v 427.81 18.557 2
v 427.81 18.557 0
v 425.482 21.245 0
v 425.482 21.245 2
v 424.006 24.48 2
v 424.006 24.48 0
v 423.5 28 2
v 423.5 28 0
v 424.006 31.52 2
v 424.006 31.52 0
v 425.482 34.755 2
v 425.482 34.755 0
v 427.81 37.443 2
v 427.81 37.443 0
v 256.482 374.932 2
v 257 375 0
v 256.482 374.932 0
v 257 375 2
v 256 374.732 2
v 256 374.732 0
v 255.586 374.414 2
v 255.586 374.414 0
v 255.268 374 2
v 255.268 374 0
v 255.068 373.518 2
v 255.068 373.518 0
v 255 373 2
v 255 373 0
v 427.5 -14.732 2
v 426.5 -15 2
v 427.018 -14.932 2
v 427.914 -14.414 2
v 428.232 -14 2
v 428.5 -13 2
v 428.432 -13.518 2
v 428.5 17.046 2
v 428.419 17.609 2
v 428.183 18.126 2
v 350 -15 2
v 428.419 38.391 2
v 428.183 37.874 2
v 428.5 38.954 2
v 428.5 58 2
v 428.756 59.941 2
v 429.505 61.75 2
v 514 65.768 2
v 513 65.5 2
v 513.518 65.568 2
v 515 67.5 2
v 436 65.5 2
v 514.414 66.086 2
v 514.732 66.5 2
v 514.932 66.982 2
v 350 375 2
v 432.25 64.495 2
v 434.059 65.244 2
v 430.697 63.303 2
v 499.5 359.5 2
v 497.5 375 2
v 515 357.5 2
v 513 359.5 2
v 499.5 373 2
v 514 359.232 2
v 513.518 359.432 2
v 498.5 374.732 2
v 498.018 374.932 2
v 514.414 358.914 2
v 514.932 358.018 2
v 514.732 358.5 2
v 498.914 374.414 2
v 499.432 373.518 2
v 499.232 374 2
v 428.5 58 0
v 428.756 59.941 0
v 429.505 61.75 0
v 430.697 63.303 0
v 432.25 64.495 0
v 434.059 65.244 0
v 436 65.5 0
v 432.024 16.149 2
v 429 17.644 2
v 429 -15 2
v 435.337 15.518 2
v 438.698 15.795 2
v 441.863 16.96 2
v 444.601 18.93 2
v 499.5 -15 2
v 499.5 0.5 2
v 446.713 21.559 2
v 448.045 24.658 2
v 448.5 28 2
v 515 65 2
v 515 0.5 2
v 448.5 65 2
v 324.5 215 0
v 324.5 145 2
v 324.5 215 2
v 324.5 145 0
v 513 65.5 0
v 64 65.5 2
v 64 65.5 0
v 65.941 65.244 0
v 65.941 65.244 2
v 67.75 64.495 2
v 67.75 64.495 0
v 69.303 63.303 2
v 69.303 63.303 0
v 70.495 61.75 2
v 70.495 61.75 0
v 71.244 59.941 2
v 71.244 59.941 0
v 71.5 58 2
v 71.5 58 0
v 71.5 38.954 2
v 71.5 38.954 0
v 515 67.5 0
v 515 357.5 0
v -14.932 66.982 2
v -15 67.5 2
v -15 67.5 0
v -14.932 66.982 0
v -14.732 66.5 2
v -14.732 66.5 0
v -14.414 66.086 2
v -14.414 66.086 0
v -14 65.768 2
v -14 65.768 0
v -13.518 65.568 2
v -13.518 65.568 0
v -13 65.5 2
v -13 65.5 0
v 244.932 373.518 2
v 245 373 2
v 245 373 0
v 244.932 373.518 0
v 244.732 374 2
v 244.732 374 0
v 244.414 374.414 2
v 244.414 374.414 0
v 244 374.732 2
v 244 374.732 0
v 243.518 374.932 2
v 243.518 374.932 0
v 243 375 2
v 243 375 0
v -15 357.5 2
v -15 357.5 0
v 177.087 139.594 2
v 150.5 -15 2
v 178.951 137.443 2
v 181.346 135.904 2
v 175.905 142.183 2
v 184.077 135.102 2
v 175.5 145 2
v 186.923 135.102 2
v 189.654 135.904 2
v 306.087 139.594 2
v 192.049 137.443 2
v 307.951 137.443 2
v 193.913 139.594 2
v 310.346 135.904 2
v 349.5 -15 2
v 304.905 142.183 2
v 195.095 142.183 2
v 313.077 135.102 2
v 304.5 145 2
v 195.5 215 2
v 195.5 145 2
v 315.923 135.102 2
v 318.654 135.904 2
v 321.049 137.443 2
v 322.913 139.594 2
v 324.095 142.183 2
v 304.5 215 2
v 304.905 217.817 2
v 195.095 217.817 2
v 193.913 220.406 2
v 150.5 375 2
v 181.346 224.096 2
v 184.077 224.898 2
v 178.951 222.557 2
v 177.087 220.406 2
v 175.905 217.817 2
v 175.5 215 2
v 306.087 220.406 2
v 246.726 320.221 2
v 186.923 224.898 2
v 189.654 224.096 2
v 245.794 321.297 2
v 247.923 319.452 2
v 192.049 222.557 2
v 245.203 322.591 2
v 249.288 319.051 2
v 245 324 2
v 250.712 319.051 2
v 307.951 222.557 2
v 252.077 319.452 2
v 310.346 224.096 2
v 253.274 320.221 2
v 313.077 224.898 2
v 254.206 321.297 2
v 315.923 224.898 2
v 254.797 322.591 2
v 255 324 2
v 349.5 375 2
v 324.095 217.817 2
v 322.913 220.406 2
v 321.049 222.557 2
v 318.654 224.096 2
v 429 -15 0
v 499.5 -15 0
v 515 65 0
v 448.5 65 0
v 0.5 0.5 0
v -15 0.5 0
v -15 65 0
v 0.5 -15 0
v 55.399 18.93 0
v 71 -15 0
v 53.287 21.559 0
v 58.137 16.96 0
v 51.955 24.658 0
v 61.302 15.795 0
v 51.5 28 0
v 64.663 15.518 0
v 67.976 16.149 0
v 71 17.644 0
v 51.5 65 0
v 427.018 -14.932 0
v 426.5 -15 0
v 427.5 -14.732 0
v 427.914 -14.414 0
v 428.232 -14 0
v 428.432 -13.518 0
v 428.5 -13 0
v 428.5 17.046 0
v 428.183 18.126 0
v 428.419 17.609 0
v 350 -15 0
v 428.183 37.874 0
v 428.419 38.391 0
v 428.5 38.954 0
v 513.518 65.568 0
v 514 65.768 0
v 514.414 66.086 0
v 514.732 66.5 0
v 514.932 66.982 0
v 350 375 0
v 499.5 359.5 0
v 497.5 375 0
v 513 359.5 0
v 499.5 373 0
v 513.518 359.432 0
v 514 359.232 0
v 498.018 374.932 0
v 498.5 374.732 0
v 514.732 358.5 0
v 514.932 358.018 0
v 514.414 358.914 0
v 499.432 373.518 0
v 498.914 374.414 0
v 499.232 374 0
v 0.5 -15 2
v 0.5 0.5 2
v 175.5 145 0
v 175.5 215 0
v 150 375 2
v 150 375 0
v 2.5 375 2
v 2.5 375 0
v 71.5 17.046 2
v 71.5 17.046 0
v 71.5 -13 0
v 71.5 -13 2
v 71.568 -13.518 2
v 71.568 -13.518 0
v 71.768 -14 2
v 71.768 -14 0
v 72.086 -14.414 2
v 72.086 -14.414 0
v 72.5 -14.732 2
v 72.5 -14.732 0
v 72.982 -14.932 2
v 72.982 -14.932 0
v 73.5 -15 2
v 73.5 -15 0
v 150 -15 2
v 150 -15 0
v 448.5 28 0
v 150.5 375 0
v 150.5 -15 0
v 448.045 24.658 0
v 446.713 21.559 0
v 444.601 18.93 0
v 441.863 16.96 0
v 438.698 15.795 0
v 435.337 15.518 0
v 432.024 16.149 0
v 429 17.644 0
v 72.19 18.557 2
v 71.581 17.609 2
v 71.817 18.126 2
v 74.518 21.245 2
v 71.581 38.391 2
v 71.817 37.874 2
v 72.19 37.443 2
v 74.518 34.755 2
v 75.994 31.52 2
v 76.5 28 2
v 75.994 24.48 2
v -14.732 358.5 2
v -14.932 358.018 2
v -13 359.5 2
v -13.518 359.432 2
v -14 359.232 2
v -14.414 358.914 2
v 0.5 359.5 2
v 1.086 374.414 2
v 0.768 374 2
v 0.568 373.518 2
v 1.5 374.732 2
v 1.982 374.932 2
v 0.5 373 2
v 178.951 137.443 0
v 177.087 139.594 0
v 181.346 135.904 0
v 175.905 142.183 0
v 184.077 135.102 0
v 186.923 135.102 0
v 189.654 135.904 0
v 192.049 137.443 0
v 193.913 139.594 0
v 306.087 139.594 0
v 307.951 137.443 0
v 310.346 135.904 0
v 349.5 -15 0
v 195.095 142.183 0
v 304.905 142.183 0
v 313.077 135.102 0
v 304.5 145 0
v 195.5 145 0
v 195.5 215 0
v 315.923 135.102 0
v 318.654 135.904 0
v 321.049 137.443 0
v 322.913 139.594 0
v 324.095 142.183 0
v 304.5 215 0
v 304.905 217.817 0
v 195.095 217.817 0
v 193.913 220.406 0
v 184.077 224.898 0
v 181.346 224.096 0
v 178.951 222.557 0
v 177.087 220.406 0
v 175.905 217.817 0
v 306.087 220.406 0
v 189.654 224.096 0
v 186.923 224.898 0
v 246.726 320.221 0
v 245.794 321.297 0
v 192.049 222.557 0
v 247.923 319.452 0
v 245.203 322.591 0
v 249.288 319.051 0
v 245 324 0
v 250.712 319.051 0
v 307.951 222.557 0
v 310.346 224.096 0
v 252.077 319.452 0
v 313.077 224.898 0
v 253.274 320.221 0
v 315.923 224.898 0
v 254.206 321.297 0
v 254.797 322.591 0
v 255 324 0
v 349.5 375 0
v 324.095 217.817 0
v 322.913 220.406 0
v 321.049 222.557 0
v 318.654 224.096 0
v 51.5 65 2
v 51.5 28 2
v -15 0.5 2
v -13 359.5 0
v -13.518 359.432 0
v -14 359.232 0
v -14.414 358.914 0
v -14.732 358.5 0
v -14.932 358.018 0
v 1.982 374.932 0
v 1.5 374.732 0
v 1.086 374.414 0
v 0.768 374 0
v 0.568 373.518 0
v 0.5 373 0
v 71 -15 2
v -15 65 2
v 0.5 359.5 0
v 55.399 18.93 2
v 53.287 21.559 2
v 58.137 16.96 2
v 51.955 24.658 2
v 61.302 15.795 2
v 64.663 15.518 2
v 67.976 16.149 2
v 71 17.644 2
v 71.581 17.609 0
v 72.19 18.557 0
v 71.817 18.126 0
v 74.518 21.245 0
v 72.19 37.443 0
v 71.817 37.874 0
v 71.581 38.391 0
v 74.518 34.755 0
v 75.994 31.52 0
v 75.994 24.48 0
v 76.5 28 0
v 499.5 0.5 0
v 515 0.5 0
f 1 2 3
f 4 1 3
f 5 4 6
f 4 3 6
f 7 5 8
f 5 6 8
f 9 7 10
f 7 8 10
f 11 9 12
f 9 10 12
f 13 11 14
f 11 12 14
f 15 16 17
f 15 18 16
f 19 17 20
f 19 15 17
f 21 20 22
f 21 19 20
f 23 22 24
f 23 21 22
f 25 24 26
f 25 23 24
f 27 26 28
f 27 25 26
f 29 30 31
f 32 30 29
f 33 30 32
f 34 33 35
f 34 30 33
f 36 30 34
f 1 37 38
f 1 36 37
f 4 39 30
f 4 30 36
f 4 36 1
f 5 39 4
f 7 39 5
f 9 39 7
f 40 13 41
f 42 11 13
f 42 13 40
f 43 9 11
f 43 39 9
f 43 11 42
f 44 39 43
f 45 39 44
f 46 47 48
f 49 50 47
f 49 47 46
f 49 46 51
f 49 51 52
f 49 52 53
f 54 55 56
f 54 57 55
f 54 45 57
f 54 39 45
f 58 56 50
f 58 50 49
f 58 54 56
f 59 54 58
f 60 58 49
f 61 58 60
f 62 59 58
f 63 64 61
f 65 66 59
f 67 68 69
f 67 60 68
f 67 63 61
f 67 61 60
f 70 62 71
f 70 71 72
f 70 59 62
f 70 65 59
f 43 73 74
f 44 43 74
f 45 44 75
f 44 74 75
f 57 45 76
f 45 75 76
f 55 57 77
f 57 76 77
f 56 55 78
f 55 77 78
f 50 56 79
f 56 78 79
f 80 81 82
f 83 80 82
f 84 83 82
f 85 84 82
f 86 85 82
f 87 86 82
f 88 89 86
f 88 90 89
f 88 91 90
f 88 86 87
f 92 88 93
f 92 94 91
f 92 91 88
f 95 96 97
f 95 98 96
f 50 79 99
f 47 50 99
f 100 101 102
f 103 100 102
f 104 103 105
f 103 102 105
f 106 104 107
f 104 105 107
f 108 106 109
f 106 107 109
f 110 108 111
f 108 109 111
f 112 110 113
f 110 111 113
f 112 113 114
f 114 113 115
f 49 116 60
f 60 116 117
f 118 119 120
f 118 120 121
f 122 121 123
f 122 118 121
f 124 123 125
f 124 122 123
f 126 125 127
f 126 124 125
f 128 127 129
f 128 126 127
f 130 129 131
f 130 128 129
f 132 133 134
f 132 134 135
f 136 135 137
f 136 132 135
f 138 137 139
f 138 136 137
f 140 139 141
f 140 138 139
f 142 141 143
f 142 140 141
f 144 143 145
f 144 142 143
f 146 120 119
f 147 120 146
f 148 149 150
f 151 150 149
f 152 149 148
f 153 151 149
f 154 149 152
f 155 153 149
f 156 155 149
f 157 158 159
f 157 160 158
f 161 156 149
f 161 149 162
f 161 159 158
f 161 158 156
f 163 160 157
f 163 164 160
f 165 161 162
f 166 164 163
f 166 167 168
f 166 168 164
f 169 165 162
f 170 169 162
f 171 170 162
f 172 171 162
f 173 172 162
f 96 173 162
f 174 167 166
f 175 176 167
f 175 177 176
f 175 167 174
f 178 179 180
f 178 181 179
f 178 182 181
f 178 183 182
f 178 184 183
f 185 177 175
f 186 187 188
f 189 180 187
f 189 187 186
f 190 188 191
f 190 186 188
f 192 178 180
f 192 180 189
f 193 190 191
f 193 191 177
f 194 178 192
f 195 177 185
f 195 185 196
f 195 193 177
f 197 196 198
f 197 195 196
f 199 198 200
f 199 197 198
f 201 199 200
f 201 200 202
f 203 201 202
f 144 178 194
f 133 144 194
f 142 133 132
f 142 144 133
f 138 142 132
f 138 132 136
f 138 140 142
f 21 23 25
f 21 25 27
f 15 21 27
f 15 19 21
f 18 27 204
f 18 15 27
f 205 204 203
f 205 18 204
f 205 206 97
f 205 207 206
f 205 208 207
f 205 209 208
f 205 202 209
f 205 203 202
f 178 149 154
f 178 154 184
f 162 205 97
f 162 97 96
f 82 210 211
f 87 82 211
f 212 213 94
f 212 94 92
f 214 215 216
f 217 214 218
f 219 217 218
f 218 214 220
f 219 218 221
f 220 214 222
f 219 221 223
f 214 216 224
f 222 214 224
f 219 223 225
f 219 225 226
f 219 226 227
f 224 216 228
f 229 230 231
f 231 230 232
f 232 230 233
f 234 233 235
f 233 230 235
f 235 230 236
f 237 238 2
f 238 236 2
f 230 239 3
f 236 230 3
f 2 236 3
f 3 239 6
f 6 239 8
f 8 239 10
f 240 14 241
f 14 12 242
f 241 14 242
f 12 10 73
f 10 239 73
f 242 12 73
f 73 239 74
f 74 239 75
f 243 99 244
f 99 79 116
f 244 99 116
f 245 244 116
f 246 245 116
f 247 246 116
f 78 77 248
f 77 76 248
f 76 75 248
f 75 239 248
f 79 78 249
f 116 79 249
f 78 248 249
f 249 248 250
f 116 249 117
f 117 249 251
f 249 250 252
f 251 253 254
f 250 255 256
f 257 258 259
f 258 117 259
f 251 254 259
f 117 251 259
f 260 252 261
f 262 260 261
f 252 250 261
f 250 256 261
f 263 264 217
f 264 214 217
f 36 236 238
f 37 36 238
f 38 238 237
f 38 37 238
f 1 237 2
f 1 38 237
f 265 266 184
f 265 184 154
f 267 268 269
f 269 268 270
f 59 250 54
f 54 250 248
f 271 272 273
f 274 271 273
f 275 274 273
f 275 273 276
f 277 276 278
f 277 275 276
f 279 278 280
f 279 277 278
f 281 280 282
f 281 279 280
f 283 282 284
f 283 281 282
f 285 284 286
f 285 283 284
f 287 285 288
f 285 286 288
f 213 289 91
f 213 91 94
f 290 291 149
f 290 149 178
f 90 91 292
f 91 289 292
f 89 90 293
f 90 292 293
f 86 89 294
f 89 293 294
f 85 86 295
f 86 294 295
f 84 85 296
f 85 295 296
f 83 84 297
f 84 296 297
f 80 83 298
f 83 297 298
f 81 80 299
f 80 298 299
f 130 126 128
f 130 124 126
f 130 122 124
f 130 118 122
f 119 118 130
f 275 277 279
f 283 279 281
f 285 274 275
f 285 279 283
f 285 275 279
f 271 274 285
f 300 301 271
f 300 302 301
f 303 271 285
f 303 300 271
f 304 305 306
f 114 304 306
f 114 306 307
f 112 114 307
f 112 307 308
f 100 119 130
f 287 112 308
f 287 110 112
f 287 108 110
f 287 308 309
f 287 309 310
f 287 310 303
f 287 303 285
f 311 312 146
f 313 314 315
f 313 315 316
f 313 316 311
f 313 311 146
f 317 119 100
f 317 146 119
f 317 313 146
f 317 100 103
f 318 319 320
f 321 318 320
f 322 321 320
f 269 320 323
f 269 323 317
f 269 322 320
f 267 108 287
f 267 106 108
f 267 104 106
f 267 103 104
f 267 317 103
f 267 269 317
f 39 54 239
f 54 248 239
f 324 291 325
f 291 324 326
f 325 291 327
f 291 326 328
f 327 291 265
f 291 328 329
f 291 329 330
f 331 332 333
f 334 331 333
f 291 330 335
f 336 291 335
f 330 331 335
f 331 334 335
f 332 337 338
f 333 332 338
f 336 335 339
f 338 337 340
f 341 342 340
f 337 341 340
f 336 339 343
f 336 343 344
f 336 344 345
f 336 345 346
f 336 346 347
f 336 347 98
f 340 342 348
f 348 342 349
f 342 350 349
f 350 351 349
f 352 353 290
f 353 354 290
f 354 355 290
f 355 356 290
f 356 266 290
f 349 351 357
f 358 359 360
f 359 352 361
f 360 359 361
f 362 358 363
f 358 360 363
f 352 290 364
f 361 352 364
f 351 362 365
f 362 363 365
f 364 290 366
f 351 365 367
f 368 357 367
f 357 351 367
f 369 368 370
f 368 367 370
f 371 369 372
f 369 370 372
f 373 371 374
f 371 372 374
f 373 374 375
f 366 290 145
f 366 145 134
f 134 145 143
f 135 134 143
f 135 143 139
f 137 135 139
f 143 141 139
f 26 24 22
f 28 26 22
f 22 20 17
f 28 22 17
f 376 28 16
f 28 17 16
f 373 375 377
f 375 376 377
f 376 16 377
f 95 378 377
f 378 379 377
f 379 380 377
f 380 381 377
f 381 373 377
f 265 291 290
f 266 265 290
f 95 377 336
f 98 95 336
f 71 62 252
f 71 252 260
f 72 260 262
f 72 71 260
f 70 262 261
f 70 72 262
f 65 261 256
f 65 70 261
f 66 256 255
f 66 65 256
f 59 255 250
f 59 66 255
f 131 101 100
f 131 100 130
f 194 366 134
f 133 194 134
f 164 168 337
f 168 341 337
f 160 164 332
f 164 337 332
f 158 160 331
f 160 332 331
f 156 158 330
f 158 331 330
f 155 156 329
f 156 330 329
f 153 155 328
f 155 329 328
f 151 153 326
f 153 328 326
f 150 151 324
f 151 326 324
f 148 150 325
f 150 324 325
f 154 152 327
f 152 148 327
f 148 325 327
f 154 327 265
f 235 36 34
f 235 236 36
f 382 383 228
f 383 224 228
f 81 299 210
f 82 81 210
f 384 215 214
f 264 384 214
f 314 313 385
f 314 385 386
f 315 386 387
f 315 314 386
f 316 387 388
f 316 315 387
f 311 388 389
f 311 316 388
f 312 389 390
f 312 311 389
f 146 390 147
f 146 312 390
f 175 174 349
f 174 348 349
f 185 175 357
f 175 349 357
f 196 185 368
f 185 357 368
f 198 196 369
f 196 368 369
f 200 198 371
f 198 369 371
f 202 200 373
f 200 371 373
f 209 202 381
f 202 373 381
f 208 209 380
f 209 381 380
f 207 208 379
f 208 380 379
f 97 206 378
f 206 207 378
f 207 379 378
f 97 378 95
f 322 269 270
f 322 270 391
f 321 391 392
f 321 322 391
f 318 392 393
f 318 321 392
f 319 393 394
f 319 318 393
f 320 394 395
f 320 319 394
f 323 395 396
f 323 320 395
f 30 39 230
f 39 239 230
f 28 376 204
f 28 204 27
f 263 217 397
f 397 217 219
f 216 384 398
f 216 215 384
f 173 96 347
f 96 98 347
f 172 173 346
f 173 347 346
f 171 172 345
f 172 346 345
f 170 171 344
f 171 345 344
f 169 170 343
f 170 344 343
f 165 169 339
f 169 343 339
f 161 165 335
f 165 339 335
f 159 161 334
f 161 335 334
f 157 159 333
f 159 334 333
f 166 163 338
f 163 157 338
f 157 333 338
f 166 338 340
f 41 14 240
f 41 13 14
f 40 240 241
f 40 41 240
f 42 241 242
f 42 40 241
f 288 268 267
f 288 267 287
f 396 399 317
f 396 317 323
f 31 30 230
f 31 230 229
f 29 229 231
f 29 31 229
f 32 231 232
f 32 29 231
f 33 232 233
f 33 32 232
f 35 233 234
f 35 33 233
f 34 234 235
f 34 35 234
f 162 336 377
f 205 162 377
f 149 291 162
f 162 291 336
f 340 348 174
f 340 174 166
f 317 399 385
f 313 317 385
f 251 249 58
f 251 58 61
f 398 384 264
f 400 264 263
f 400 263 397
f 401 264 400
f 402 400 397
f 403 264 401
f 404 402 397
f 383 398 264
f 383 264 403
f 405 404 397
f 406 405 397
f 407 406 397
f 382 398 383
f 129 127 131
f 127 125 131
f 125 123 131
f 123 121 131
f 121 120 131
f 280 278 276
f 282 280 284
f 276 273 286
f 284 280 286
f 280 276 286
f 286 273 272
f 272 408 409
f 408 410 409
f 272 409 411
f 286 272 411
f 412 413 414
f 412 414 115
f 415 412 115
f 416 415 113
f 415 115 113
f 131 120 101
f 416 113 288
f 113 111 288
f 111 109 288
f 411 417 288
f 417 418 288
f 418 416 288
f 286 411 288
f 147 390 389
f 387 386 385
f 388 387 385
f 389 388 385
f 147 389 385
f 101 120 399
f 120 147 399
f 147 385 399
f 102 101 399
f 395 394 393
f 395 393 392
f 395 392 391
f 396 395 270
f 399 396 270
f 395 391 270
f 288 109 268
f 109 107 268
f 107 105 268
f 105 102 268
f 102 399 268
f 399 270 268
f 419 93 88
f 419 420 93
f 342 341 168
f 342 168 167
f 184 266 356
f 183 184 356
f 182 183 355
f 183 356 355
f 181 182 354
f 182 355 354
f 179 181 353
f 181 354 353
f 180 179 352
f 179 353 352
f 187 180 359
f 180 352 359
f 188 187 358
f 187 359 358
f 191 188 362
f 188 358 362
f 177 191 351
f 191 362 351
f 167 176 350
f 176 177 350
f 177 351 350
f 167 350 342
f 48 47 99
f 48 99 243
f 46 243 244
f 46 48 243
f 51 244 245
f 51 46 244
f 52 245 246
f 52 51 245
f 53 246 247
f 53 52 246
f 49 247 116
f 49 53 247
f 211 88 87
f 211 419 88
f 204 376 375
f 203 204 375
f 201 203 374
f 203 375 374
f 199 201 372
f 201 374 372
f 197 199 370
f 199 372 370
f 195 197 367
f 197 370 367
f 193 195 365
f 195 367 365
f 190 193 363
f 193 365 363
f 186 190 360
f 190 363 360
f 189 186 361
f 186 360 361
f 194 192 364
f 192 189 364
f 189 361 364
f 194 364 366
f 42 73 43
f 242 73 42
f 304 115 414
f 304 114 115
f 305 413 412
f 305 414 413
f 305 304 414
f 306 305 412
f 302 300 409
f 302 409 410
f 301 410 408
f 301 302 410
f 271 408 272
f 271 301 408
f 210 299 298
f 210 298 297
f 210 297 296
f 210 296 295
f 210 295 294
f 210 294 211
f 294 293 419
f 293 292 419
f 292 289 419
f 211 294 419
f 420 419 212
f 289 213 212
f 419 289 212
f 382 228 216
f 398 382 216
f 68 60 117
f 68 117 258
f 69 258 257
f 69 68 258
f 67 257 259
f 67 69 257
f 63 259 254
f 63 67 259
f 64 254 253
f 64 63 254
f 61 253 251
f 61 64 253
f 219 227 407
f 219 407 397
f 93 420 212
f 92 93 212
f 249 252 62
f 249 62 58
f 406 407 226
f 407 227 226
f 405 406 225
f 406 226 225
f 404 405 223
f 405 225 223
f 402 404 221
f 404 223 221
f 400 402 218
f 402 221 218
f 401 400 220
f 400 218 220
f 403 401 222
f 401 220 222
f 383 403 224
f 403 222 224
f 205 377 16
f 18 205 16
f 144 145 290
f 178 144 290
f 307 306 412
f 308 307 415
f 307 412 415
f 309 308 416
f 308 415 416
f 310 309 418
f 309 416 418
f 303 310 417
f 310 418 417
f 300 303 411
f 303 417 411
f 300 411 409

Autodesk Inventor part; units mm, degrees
ref_plane "YZ Plane" through (0, 0, 0) normal (1, 0, 0) x (0, 1, 0)
ref_plane "XZ Plane" through (0, 0, 0) normal (0, 1, 0) x (-1, 0, 0)
ref_plane "XY Plane" through (0, 0, 0) normal (0, 0, 1) x (1, 0, 0)
sketch "Sketch1" plane through (0, 0, 0) normal (0, 0, 1) x (1, 0, 0)
  line L0 (500, 375) -> (0, 375) projected
  line L1 (-15, 0) -> (-15, 360) projected
  line L2 (0, 0) -> (0, 360) projected
  line L3 (515, 0) -> (515, 360) projected
  line L4 (0, 0) -> (500, 0) projected
  line L5 (500, 0) -> (500, 360) projected
  line L6 (500, 360) -> (0, 360) projected
  line L7 (0, -15) -> (500, -15) projected
  line L8 (-15, 359.5) -> (0, 359.5)
  line L9 (0.5, 360) -> (0.5, 375)
  line L10 (0, 0.5) -> (-15, 0.5)
  line L11 (0.5, 0) -> (0.5, -15)
  line L12 (499.5, 375) -> (499.5, 360)
  line L13 (500, 359.5) -> (515, 359.5)
  line L14 (499.5, 0) -> (499.5, -15)
  line L15 (500, 0.5) -> (515, 0.5)
  line L16 (350, 375) -> (350, -15)
  line L17 (349.5, -15) -> (349.5, 375)
  line L18 (150, 375) -> (150, -15)
  line L19 (150.5, -15) -> (150.5, 375)
  circle A0 centre (250, 324) radius 3 projected
  circle A1 centre (250, 324) radius 5
  line L20 (245, 324) -> (245, 375)
  line L21 (255, 324) -> (255, 375)
  circle A2 centre (436, 58) radius 3 projected
  circle A3 centre (64, 58) radius 3 projected
  circle A4 centre (64, 58) radius 7.5
  circle A5 centre (436, 58) radius 7.5
  line L22 (64, 65.5) -> (-15, 65.5)
  line L23 (71.5, 58) -> (71.5, -15)
  line L24 (428.5, 58) -> (428.5, -15)
  line L25 (436, 65.5) -> (515, 65.5)
  circle A6 centre (436, 28) radius 6 projected
  circle A7 centre (64, 28) radius 6 projected
  circle A8 centre (64, 28) radius 12.5
  circle A9 centre (436, 28) radius 12.5
  line L26 (0.5, 360) -> (0.5, 359.5)
  line L27 (0.5, 359.5) -> (0, 359.5)
  line L28 (499.5, 360) -> (499.5, 359.5)
  line L29 (499.5, 359.5) -> (500, 359.5)
  line L30 (0, 0.5) -> (0.5, 0.5)
  line L31 (0.5, 0.5) -> (0.5, 0)
  line L32 (500, 0.5) -> (499.5, 0.5)
  line L33 (499.5, 0.5) -> (499.5, 0)
  line L34 (71, 17.6438) -> (71, -15)
  line L35 (51.5, 28) -> (51.5, 65)
  line L36 (51.5, 65) -> (-15, 65)
  line L37 (429, 17.6438) -> (429, -15)
  line L38 (448.5, 28) -> (448.5, 65)
  line L39 (448.5, 65) -> (515, 65)
  line L40 (185.5, 215) -> (185.5, 145) construction
  line L41 (175.5, 215) -> (175.5, 145)
  line L42 (195.5, 145) -> (195.5, 215)
  arc A10 (195.5, 215) -> (175.5, 215) centre (185.5, 215) ccw
  arc A11 (175.5, 145) -> (195.5, 145) centre (185.5, 145) ccw
  line L43 (314.5, 145) -> (314.5, 215) construction
  line L44 (324.5, 145) -> (324.5, 215)
  line L45 (304.5, 215) -> (304.5, 145)
  arc A12 (304.5, 145) -> (324.5, 145) centre (314.5, 145) ccw
  arc A13 (324.5, 215) -> (304.5, 215) centre (314.5, 215) ccw
  point P0 (0, 65.5)
  point P1 (71.5, 0)
  point P2 (428.5, 0)
  point P3 (500, 65.5)
  point P4 (350, 360)
  point P5 (350, 0)
  point P6 (255, 360)
  point P7 (245, 360)
  point P8 (150.5, 360)
  point P9 (150.5, 0)
  point P10 (349.5, 0)
  point P11 (349.5, 360)
  point P12 (150, 0)
  point P13 (150, 360)
  point P14 (71.5, 38)
  point P15 (71.5, 18)
  point P16 (428.5, 18)
  point P17 (428.5, 38)
  point P18 (185.5, 180)
  point P19 (314.5, 180)
  point P20 (0, 180)
  dimension "d0" = 0.5
  dimension "d1" = 0.5
  dimension "d2" = 0.5
  dimension "d3" = 0.5
  dimension "d4" = 0.5
  dimension "d5" = 0.5
  dimension "d6" = 0.5
  dimension "d7" = 0.5
  dimension "d8" = 0.5
  dimension "d9" = 0.5
  dimension "d10" = 150
  dimension "d11" = 150
  dimension "d12" = 10
  dimension "d13" = 15
  dimension "d16" = 25
  dimension "d18" = 0.5
  dimension "d19" = 0.5
  dimension "d20" = 0.5
  dimension "d21" = 0.5
  dimension "d22" = 20
  dimension "d23" = 70
  dimension "d24" = 25
  dimension "d25" = 25
extrude "Extrusion1" add sketch "Sketch1" along normal blind 2 contours L12 L6 L16 L0 | L28 L29 L5 L25 A5 L24 A9 L4 L16 L6 | L17 L6 L21 L0 | L17 L4 L19 L6 L20 A1 L21 | L4 L24 L7 L16 | L13 L3 L25 L5 | L20 L6 L19 L0 | L17 L7 L19 L4 | L37 A9 L38 L39 L5 L32 L33 L4 | L4 L14 L7 L37 | L39 L3 L15 L5 | L18 L6 L9 L0 | L18 L7 L23 L4 | L4 L23 A8 A4 L22 L2 L27 L26 L6 L18 | L34 L7 L11 L4 | L4 L31 L30 L2 L36 L35 A8 L34 | L2 L22 L1 L8 | L10 L1 L36 L2
fillet "Fillet1" radius 2 14 edges at (71.5, 38, 1) (71.5, 18, 1) (428.5, 18, 1) (428.5, 38, 1) (428.5, -15, 1) (515, 65.5, 1) (515, 359.5, 1) (499.5, 375, 1) (71.5, -15, 1) (-15, 65.5, 1) (0.5, 375, 1) (-15, 359.5, 1) (255, 375, 1) (245, 375, 1)
equation "\"d1\" = d0"
equation "\"d2\" = d0"
equation "\"d3\" = d0"
equation "\"d4\" = d0"
equation "\"d5\" = d0"
equation "\"d6\" = d0"
equation "\"d7\" = d0"
equation "\"d8\" = d0"
equation "\"d9\" = d0"
equation "\"d11\" = d10"
equation "\"d19\" = d18"
equation "\"d20\" = d18"
equation "\"d21\" = d20"
equation "\"d25\" = d24"
properties part number "Electronics Cover" material "Aluminum 6061"
